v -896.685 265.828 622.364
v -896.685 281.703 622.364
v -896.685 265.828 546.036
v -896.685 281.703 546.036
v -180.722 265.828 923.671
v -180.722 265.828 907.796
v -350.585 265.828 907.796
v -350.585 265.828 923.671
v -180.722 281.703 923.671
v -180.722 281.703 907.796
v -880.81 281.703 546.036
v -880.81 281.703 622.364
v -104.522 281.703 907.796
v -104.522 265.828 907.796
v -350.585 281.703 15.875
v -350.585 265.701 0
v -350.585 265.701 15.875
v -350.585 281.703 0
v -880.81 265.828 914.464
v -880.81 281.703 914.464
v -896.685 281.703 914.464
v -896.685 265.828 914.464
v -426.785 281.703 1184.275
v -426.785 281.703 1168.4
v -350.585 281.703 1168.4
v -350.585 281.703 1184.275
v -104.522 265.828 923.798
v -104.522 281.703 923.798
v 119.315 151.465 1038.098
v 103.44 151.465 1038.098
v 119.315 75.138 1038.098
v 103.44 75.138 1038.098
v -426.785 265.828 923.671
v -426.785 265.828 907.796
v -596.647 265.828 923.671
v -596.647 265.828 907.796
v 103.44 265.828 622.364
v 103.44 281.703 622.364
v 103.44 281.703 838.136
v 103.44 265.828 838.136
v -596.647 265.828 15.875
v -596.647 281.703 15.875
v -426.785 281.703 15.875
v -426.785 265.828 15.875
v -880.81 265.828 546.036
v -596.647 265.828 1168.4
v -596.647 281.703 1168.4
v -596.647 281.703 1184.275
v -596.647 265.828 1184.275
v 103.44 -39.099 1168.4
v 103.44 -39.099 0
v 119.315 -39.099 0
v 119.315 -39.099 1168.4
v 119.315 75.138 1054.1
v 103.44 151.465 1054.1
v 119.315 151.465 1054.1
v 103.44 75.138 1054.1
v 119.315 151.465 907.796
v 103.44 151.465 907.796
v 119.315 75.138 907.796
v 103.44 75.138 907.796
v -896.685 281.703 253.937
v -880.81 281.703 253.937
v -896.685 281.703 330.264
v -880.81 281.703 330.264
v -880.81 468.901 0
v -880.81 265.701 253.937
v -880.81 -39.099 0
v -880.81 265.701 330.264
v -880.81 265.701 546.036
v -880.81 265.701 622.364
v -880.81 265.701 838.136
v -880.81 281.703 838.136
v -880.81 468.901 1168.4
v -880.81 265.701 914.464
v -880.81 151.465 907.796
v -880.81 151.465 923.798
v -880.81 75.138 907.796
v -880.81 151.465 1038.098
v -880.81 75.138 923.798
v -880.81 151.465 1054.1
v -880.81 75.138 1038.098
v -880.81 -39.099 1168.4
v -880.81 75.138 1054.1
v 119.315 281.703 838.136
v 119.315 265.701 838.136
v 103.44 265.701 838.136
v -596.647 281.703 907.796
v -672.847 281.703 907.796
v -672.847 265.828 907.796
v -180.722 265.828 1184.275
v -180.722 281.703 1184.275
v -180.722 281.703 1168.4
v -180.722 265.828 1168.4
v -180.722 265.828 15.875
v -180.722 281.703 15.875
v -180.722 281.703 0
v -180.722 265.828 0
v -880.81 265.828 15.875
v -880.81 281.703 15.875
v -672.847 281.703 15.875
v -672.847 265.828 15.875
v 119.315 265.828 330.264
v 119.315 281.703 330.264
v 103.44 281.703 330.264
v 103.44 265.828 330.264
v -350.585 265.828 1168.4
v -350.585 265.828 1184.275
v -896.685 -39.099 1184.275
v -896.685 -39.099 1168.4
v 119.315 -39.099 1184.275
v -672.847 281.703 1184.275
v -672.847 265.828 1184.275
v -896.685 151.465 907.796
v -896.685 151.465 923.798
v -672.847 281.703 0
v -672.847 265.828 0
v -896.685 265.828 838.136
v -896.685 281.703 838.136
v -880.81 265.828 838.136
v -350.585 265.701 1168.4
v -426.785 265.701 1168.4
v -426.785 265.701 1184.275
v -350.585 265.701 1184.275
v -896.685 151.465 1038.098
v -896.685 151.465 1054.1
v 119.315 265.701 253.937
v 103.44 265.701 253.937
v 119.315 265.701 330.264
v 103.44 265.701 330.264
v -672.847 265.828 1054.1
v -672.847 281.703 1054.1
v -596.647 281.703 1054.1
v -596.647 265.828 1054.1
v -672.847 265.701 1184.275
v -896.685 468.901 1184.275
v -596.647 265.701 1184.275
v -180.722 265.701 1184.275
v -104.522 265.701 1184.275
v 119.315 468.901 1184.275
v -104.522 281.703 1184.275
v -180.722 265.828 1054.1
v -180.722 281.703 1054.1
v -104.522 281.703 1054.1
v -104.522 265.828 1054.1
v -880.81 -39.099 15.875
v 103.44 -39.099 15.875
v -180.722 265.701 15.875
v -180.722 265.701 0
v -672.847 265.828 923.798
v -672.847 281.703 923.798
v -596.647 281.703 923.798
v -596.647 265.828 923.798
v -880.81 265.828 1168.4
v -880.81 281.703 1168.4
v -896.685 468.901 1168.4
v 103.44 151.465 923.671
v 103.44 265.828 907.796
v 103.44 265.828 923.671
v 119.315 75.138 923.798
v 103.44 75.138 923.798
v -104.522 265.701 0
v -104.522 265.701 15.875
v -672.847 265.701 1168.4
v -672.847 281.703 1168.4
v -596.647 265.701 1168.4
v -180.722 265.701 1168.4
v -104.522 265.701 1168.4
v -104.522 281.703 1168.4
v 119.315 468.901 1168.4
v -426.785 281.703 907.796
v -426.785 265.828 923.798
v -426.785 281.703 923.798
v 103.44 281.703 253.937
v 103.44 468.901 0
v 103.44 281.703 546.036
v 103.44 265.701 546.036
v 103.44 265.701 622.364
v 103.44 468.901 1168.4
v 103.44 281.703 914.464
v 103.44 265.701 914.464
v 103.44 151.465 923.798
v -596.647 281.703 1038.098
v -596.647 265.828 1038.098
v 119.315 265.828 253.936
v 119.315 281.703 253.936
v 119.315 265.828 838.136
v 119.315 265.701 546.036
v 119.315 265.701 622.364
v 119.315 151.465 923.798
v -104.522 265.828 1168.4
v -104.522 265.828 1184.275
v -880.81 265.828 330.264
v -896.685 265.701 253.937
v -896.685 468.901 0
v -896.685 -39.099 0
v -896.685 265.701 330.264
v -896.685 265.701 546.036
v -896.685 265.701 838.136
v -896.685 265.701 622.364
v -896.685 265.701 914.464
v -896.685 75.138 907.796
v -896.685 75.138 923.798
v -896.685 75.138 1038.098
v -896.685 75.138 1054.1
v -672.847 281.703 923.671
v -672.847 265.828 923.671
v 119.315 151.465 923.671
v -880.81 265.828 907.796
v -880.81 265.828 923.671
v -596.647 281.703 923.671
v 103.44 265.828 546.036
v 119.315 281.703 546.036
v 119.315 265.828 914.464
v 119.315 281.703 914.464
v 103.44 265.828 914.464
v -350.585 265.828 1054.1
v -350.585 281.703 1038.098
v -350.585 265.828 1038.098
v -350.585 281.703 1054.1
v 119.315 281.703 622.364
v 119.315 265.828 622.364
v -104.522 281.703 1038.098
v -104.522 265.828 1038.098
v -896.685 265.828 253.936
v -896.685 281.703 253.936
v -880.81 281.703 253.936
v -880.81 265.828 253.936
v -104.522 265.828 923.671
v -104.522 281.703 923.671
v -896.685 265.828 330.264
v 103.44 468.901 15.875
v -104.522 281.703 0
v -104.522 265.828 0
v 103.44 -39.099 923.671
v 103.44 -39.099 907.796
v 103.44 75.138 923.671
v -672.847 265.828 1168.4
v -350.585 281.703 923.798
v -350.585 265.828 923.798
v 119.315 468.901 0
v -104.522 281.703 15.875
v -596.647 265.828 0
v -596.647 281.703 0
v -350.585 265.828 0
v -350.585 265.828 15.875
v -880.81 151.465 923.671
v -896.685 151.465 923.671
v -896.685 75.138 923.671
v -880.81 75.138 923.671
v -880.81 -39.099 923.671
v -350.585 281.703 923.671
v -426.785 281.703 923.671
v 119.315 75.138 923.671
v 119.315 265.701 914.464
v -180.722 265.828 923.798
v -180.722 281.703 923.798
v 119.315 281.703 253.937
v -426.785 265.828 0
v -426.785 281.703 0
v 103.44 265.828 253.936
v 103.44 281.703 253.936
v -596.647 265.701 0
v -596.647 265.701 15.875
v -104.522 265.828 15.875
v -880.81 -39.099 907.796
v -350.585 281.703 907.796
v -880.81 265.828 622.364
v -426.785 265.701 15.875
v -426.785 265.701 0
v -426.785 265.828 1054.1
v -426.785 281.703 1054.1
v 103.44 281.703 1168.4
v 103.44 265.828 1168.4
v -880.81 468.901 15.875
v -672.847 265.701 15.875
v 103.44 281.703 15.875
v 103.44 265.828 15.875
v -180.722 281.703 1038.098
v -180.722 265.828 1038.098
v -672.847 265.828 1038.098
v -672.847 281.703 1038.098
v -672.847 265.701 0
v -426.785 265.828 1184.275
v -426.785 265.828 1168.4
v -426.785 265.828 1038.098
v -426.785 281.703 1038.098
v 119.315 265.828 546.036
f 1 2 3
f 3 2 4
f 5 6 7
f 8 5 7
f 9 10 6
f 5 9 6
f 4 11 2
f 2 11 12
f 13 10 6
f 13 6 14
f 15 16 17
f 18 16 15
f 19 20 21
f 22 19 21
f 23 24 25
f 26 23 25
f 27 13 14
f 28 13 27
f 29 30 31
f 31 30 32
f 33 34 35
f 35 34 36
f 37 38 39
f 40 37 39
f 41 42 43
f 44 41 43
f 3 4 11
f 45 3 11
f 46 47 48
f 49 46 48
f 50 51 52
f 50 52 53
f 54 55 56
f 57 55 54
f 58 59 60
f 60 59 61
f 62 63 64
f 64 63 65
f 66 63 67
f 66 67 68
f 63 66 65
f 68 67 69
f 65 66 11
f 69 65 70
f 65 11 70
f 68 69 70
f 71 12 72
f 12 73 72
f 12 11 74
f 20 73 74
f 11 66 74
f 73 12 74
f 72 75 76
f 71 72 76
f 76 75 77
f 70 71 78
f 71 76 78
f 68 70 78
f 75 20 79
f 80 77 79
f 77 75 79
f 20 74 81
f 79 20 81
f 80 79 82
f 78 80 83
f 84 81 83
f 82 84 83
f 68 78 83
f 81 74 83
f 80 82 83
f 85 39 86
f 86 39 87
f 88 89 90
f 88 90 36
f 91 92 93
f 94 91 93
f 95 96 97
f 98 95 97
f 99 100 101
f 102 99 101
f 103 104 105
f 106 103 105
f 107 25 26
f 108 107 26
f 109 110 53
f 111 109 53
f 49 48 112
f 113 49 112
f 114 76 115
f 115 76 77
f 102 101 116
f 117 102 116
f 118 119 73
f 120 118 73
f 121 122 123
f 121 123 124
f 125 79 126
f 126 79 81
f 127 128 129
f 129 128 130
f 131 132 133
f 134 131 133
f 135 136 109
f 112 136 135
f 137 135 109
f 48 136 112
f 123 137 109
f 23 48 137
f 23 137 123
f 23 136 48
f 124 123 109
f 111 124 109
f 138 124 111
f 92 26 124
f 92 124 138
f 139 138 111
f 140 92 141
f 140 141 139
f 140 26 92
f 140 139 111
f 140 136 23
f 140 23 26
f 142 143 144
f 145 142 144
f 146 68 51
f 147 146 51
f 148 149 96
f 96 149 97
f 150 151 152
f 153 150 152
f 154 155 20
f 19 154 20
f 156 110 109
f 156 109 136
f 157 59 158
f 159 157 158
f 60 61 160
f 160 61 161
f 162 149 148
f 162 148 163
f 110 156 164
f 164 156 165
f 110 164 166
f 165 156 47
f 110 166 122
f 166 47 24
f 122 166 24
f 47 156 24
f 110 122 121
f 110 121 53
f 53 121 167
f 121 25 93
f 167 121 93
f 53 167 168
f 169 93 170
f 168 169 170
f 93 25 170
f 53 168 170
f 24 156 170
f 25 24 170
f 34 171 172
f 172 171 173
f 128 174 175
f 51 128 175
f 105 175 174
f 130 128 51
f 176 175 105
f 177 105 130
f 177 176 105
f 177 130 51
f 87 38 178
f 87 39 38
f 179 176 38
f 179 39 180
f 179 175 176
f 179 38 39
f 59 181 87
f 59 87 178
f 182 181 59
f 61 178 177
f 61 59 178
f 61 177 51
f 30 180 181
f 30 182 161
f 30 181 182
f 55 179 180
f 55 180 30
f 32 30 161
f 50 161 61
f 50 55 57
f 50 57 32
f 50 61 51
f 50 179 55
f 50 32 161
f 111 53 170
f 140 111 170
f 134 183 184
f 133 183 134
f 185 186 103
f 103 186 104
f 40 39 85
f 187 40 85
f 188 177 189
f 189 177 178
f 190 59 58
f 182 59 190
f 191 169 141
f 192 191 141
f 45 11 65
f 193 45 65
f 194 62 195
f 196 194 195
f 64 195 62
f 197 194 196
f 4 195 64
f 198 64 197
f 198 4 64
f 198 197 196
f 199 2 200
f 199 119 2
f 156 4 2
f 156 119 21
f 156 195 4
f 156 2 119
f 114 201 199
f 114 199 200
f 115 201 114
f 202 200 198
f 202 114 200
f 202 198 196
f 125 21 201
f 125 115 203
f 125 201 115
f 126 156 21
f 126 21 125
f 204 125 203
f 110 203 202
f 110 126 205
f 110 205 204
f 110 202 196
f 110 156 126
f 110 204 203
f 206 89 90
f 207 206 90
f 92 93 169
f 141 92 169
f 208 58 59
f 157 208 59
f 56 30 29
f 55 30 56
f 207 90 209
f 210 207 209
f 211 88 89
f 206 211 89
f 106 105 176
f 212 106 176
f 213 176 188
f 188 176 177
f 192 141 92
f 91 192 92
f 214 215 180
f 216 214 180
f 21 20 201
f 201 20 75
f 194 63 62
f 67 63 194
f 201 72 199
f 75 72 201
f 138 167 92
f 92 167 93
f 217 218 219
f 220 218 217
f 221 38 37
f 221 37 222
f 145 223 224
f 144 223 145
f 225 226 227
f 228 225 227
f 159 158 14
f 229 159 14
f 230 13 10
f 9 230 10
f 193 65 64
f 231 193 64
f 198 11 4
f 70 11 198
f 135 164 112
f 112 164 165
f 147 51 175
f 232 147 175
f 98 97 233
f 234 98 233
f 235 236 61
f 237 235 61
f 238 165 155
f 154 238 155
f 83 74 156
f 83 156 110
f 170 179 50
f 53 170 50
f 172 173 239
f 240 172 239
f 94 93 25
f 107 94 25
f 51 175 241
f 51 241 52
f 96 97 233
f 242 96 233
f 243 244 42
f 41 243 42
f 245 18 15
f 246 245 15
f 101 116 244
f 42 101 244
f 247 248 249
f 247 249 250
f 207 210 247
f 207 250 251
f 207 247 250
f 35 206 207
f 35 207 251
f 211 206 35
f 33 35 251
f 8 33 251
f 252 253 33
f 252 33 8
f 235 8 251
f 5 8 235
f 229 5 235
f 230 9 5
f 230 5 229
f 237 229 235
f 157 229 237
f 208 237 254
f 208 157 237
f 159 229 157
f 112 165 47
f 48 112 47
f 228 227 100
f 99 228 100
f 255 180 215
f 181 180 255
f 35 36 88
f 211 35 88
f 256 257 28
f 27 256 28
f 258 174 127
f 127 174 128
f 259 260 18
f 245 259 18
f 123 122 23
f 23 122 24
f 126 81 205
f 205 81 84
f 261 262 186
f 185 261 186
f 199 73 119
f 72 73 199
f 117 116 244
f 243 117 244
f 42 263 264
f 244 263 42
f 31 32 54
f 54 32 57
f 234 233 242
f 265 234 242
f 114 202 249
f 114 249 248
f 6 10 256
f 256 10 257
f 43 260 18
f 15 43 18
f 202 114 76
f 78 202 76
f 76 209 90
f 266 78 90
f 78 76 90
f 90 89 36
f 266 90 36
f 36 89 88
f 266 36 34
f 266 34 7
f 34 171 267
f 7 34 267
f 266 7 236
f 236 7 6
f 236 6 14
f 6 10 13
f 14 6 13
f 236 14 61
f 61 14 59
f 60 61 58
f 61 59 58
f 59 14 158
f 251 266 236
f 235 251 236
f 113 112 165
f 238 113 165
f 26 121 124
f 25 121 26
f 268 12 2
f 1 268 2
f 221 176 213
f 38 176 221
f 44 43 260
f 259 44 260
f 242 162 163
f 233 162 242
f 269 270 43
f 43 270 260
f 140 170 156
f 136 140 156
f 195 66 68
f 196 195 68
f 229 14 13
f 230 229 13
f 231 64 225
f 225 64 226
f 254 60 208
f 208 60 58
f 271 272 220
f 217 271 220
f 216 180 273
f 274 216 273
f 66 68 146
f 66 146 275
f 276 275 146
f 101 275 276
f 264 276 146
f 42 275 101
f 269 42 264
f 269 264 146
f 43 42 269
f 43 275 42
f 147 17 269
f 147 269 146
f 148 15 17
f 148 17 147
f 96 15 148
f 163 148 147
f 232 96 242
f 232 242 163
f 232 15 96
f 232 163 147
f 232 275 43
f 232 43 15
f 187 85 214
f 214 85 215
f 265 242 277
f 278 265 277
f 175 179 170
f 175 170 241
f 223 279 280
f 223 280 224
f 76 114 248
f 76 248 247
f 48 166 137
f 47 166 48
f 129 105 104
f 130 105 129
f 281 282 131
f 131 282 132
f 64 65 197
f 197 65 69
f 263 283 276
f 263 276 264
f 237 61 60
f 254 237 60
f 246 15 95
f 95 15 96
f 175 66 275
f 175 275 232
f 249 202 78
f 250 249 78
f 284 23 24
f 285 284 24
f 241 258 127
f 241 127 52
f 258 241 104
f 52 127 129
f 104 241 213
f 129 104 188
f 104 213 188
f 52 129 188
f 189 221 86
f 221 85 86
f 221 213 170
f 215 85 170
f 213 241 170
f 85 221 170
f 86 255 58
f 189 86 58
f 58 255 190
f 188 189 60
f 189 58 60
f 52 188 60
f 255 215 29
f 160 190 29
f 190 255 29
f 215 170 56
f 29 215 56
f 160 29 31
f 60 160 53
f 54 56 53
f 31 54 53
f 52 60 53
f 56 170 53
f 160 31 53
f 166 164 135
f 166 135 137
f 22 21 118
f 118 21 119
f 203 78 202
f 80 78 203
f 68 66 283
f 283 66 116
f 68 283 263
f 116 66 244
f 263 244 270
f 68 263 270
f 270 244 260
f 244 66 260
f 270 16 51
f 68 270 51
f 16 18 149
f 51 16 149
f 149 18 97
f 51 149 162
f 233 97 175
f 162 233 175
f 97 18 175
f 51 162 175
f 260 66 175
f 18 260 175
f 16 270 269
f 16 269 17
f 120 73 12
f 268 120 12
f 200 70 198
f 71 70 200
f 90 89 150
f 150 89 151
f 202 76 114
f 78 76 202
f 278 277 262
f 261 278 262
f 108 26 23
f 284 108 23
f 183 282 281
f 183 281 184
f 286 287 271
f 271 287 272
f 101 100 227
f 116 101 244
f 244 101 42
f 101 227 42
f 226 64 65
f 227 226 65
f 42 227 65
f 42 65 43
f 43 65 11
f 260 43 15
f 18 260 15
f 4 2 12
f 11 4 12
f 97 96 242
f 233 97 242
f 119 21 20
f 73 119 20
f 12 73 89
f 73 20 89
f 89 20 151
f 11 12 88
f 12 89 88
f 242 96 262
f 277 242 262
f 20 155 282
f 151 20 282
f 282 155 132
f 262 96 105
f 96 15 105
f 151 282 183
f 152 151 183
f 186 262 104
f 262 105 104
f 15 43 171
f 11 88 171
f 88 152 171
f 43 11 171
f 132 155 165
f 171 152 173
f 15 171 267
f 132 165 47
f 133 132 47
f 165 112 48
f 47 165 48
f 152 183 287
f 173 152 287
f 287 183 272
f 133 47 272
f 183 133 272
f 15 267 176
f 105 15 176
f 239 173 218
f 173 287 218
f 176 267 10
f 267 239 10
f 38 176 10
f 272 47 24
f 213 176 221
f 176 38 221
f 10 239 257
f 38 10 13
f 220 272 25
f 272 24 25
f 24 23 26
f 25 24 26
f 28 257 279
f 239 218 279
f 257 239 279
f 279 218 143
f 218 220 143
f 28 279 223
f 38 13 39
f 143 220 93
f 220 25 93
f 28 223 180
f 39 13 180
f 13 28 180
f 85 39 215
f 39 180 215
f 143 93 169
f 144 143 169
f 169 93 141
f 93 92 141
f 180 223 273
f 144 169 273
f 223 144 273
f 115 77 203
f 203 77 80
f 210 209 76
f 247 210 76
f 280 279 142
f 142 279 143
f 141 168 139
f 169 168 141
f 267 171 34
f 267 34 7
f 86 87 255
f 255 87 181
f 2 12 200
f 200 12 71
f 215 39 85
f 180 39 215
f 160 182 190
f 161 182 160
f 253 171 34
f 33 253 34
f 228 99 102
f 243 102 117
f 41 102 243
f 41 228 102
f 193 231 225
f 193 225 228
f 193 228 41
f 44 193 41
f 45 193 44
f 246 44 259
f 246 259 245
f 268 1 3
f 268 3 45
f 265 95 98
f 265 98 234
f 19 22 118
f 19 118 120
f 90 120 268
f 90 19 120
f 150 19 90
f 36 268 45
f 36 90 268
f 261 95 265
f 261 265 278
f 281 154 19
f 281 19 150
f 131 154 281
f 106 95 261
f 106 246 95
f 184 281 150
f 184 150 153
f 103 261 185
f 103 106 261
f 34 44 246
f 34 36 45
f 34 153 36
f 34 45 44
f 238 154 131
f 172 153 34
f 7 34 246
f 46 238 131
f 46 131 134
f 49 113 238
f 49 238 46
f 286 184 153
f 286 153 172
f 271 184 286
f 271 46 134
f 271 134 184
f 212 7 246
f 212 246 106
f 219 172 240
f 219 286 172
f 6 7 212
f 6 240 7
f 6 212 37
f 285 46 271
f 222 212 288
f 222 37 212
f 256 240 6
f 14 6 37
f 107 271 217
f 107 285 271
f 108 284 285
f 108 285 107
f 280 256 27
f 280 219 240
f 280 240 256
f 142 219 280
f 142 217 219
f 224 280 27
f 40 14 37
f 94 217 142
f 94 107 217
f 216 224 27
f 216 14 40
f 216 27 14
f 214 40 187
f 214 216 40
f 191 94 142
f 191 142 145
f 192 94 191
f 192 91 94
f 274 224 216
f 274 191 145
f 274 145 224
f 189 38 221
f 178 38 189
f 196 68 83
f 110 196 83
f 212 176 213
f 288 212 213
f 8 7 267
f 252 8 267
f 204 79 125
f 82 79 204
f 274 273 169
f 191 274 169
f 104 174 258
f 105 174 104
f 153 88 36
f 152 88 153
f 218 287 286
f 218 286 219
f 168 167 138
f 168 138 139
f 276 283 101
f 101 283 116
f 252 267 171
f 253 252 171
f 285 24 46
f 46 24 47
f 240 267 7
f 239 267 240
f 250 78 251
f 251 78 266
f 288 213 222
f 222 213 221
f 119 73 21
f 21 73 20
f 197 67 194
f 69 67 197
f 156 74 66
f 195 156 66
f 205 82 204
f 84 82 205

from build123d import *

# Parameters (mm, degrees)
F0_W      = 984.25
F0_H      = 508
F0_W_2    = 76.2
F0_H_2    = 16.002
F1_DEPTH  = 15.875
F2_W      = 508
F2_H      = 1152.525
F2_W_2    = 16.002
F2_H_2    = 76.327
F2_W_3    = 76.327
F2_H_3    = 16.002
F2_H_4    = 15.875
F3_DEPTH  = 15.875
F9_W      = 1000.125
F9_H      = 508
F9_W_2    = 76.2
F9_H_2    = 16.002
F9_W_3    = 15.875
F10_DEPTH = 15.875
F11_W     = 76.2
F11_H     = 16.002
F11_W_2   = 15.875
F11_H_2   = 76.327
F12_DEPTH = 15.875
F13_W     = 15.875
F13_H     = 76.327
F14_DEPTH = 15.875


with BuildPart() as f1:
    # F0 (on Top) → F1 (new body)
    with BuildSketch(Plane.XY):
        with Locations((-388.6847227216, 214.9014615417)):
            Rectangle(F0_W, F0_H)
        with Locations((-634.7472227216, 273.7024615417)):
            Rectangle(F0_W_2, F0_H_2, mode=Mode.SUBTRACT)
        with Locations((-388.6847227216, 273.7024615417)):
            Rectangle(F0_W_2, F0_H_2, mode=Mode.SUBTRACT)
        with Locations((-142.6222227216, 273.7024615417)):
            Rectangle(F0_W_2, F0_H_2, mode=Mode.SUBTRACT)
    extrude(amount=F1_DEPTH)


with BuildPart() as f3:
    # F2 (on face) → F3 (new body)
    with BuildSketch(Plane(origin=(-880.8097227216, 0, 0), x_dir=(0, -1, 0), z_dir=(-1, 0, 0))):
        with Locations((-214.9014615417, 592.1375)):
            Rectangle(F2_W, F2_H)
        with Locations((-273.7024615417, 292.1)):
            Rectangle(F2_W_2, F2_H_2, mode=Mode.SUBTRACT)
        with Locations((-273.7024615417, 584.2)):
            Rectangle(F2_W_2, F2_H_2, mode=Mode.SUBTRACT)
        with Locations((-273.7024615417, 876.3)):
            Rectangle(F2_W_2, F2_H_2, mode=Mode.SUBTRACT)
        with Locations((-113.3014615417, 915.797)):
            Rectangle(F2_W_3, F2_H_3, mode=Mode.SUBTRACT)
        with Locations((-113.3014615417, 1046.099)):
            Rectangle(F2_W_3, F2_H_3, mode=Mode.SUBTRACT)
        with Locations((-214.9014615417, 7.9375)):
            Rectangle(F2_W, F2_H_4)
    extrude(amount=F3_DEPTH)


with BuildPart() as f8_1:
    # F8: instance of F3
    add(f3.part.mirror(Plane(origin=(-388.6847227216, -39.0985384583, 15.875), x_dir=(0, 1, 0), z_dir=(1, 0, 0))))


with BuildPart() as f10:
    # F9 (on face) → F10 (new body)
    with BuildSketch(Plane.XY.offset(1168.4)):
        with Locations((-380.7472227216, 214.9014615417)):
            Rectangle(F9_W, F9_H)
        with Locations((-634.7472227216, 273.7024615417)):
            Rectangle(F9_W_2, F9_H_2, mode=Mode.SUBTRACT)
        with Locations((-388.6847227216, 273.7024615417)):
            Rectangle(F9_W_2, F9_H_2, mode=Mode.SUBTRACT)
        with Locations((-142.6222227216, 273.7024615417)):
            Rectangle(F9_W_2, F9_H_2, mode=Mode.SUBTRACT)
        with Locations((-888.7472227216, 214.9014615417)):
            Rectangle(F9_W_3, F9_H)
    extrude(amount=F10_DEPTH)


with BuildPart() as f12:
    # F11 (on face) → F12 (new body)
    with BuildSketch(Plane.XZ.offset(-281.7034615417)):
        Polygon((-180.7222227216, 1168.4), (-350.5847227216, 1168.4), (-350.5847227216, 1184.275), (-426.7847227216, 1184.275), (-426.7847227216, 1168.4), (-596.6472227216, 1168.4), (-596.6472227216, 1184.275), (-672.8472227216, 1184.275), (-672.8472227216, 1168.4), (-880.8097227216, 1168.4), (-880.8097227216, 914.4635), (-896.6847227216, 914.4635), (-896.6847227216, 838.1365), (-880.8097227216, 838.1365), (-880.8097227216, 622.3635), (-896.6847227216, 622.3635), (-896.6847227216, 546.0365), (-880.8097227216, 546.0365), (-880.8097227216, 330.2635), (-896.6847227216, 330.2635), (-896.6847227216, 253.9365), (-880.8097227216, 253.9365), (-880.8097227216, 15.875), (-672.8472227216, 15.875), (-672.8472227216, 0), (-596.6472227216, 0), (-596.6472227216, 15.875), (-426.7847227216, 15.875), (-426.7847227216, 0), (-350.5847227216, 0), (-350.5847227216, 15.875), (-180.7222227216, 15.875), (-180.7222227216, 0), (-104.5222227216, 0), (-104.5222227216, 15.875), (103.4402772784, 15.875), (103.4402772784, 253.9365), (119.3152772784, 253.9365), (119.3152772784, 330.2635), (103.4402772784, 330.2635), (103.4402772784, 546.0365), (103.4402772784, 622.3635), (103.4402772784, 838.1365), (119.3152772784, 838.1365), (119.3152772784, 914.4635), (103.4402772784, 914.4635), (103.4402772784, 1168.4), (-104.5222227216, 1168.4), (-104.5222227216, 1184.275), (-180.7222227216, 1184.275), align=None)
        with Locations((-634.7472227216, 915.797)):
            Rectangle(F11_W, F11_H, mode=Mode.SUBTRACT)
        with Locations((-634.7472227216, 1046.099)):
            Rectangle(F11_W, F11_H, mode=Mode.SUBTRACT)
        with Locations((-388.6847227216, 915.797)):
            Rectangle(F11_W, F11_H, mode=Mode.SUBTRACT)
        with Locations((-142.6222227216, 915.797)):
            Rectangle(F11_W, F11_H, mode=Mode.SUBTRACT)
        with Locations((-388.6847227216, 1046.099)):
            Rectangle(F11_W, F11_H, mode=Mode.SUBTRACT)
        with Locations((-142.6222227216, 1046.099)):
            Rectangle(F11_W, F11_H, mode=Mode.SUBTRACT)
        with Locations((111.3777772784, 584.2)):
            Rectangle(F11_W_2, F11_H_2)
    extrude(amount=F12_DEPTH)


with BuildPart() as f14:
    # F13 (on face) → F14 (new body)
    with BuildSketch(Plane.XY.offset(907.796)):
        Polygon((-596.6472227216, 265.8284615417), (-596.6472227216, 281.7034615417), (-672.8472227216, 281.7034615417), (-672.8472227216, 265.8284615417), (-880.8097227216, 265.8284615417), (-880.8097227216, 151.4649615417), (-880.8097227216, 75.1379615417), (-880.8097227216, -39.0985384583), (103.4402772784, -39.0985384583), (103.4402772784, 75.1379615417), (119.3152772784, 75.1379615417), (119.3152772784, 151.4649615417), (103.4402772784, 151.4649615417), (103.4402772784, 265.8284615417), (-104.5222227216, 265.8284615417), (-104.5222227216, 281.7034615417), (-180.7222227216, 281.7034615417), (-180.7222227216, 265.8284615417), (-350.5847227216, 265.8284615417), (-350.5847227216, 281.7034615417), (-426.7847227216, 281.7034615417), (-426.7847227216, 265.8284615417), align=None)
        with Locations((-888.7472227216, 113.3014615417)):
            Rectangle(F13_W, F13_H)
    extrude(amount=F14_DEPTH)


solid = Compound([f1.part, f3.part, f8_1.part, f10.part, f12.part, f14.part])
